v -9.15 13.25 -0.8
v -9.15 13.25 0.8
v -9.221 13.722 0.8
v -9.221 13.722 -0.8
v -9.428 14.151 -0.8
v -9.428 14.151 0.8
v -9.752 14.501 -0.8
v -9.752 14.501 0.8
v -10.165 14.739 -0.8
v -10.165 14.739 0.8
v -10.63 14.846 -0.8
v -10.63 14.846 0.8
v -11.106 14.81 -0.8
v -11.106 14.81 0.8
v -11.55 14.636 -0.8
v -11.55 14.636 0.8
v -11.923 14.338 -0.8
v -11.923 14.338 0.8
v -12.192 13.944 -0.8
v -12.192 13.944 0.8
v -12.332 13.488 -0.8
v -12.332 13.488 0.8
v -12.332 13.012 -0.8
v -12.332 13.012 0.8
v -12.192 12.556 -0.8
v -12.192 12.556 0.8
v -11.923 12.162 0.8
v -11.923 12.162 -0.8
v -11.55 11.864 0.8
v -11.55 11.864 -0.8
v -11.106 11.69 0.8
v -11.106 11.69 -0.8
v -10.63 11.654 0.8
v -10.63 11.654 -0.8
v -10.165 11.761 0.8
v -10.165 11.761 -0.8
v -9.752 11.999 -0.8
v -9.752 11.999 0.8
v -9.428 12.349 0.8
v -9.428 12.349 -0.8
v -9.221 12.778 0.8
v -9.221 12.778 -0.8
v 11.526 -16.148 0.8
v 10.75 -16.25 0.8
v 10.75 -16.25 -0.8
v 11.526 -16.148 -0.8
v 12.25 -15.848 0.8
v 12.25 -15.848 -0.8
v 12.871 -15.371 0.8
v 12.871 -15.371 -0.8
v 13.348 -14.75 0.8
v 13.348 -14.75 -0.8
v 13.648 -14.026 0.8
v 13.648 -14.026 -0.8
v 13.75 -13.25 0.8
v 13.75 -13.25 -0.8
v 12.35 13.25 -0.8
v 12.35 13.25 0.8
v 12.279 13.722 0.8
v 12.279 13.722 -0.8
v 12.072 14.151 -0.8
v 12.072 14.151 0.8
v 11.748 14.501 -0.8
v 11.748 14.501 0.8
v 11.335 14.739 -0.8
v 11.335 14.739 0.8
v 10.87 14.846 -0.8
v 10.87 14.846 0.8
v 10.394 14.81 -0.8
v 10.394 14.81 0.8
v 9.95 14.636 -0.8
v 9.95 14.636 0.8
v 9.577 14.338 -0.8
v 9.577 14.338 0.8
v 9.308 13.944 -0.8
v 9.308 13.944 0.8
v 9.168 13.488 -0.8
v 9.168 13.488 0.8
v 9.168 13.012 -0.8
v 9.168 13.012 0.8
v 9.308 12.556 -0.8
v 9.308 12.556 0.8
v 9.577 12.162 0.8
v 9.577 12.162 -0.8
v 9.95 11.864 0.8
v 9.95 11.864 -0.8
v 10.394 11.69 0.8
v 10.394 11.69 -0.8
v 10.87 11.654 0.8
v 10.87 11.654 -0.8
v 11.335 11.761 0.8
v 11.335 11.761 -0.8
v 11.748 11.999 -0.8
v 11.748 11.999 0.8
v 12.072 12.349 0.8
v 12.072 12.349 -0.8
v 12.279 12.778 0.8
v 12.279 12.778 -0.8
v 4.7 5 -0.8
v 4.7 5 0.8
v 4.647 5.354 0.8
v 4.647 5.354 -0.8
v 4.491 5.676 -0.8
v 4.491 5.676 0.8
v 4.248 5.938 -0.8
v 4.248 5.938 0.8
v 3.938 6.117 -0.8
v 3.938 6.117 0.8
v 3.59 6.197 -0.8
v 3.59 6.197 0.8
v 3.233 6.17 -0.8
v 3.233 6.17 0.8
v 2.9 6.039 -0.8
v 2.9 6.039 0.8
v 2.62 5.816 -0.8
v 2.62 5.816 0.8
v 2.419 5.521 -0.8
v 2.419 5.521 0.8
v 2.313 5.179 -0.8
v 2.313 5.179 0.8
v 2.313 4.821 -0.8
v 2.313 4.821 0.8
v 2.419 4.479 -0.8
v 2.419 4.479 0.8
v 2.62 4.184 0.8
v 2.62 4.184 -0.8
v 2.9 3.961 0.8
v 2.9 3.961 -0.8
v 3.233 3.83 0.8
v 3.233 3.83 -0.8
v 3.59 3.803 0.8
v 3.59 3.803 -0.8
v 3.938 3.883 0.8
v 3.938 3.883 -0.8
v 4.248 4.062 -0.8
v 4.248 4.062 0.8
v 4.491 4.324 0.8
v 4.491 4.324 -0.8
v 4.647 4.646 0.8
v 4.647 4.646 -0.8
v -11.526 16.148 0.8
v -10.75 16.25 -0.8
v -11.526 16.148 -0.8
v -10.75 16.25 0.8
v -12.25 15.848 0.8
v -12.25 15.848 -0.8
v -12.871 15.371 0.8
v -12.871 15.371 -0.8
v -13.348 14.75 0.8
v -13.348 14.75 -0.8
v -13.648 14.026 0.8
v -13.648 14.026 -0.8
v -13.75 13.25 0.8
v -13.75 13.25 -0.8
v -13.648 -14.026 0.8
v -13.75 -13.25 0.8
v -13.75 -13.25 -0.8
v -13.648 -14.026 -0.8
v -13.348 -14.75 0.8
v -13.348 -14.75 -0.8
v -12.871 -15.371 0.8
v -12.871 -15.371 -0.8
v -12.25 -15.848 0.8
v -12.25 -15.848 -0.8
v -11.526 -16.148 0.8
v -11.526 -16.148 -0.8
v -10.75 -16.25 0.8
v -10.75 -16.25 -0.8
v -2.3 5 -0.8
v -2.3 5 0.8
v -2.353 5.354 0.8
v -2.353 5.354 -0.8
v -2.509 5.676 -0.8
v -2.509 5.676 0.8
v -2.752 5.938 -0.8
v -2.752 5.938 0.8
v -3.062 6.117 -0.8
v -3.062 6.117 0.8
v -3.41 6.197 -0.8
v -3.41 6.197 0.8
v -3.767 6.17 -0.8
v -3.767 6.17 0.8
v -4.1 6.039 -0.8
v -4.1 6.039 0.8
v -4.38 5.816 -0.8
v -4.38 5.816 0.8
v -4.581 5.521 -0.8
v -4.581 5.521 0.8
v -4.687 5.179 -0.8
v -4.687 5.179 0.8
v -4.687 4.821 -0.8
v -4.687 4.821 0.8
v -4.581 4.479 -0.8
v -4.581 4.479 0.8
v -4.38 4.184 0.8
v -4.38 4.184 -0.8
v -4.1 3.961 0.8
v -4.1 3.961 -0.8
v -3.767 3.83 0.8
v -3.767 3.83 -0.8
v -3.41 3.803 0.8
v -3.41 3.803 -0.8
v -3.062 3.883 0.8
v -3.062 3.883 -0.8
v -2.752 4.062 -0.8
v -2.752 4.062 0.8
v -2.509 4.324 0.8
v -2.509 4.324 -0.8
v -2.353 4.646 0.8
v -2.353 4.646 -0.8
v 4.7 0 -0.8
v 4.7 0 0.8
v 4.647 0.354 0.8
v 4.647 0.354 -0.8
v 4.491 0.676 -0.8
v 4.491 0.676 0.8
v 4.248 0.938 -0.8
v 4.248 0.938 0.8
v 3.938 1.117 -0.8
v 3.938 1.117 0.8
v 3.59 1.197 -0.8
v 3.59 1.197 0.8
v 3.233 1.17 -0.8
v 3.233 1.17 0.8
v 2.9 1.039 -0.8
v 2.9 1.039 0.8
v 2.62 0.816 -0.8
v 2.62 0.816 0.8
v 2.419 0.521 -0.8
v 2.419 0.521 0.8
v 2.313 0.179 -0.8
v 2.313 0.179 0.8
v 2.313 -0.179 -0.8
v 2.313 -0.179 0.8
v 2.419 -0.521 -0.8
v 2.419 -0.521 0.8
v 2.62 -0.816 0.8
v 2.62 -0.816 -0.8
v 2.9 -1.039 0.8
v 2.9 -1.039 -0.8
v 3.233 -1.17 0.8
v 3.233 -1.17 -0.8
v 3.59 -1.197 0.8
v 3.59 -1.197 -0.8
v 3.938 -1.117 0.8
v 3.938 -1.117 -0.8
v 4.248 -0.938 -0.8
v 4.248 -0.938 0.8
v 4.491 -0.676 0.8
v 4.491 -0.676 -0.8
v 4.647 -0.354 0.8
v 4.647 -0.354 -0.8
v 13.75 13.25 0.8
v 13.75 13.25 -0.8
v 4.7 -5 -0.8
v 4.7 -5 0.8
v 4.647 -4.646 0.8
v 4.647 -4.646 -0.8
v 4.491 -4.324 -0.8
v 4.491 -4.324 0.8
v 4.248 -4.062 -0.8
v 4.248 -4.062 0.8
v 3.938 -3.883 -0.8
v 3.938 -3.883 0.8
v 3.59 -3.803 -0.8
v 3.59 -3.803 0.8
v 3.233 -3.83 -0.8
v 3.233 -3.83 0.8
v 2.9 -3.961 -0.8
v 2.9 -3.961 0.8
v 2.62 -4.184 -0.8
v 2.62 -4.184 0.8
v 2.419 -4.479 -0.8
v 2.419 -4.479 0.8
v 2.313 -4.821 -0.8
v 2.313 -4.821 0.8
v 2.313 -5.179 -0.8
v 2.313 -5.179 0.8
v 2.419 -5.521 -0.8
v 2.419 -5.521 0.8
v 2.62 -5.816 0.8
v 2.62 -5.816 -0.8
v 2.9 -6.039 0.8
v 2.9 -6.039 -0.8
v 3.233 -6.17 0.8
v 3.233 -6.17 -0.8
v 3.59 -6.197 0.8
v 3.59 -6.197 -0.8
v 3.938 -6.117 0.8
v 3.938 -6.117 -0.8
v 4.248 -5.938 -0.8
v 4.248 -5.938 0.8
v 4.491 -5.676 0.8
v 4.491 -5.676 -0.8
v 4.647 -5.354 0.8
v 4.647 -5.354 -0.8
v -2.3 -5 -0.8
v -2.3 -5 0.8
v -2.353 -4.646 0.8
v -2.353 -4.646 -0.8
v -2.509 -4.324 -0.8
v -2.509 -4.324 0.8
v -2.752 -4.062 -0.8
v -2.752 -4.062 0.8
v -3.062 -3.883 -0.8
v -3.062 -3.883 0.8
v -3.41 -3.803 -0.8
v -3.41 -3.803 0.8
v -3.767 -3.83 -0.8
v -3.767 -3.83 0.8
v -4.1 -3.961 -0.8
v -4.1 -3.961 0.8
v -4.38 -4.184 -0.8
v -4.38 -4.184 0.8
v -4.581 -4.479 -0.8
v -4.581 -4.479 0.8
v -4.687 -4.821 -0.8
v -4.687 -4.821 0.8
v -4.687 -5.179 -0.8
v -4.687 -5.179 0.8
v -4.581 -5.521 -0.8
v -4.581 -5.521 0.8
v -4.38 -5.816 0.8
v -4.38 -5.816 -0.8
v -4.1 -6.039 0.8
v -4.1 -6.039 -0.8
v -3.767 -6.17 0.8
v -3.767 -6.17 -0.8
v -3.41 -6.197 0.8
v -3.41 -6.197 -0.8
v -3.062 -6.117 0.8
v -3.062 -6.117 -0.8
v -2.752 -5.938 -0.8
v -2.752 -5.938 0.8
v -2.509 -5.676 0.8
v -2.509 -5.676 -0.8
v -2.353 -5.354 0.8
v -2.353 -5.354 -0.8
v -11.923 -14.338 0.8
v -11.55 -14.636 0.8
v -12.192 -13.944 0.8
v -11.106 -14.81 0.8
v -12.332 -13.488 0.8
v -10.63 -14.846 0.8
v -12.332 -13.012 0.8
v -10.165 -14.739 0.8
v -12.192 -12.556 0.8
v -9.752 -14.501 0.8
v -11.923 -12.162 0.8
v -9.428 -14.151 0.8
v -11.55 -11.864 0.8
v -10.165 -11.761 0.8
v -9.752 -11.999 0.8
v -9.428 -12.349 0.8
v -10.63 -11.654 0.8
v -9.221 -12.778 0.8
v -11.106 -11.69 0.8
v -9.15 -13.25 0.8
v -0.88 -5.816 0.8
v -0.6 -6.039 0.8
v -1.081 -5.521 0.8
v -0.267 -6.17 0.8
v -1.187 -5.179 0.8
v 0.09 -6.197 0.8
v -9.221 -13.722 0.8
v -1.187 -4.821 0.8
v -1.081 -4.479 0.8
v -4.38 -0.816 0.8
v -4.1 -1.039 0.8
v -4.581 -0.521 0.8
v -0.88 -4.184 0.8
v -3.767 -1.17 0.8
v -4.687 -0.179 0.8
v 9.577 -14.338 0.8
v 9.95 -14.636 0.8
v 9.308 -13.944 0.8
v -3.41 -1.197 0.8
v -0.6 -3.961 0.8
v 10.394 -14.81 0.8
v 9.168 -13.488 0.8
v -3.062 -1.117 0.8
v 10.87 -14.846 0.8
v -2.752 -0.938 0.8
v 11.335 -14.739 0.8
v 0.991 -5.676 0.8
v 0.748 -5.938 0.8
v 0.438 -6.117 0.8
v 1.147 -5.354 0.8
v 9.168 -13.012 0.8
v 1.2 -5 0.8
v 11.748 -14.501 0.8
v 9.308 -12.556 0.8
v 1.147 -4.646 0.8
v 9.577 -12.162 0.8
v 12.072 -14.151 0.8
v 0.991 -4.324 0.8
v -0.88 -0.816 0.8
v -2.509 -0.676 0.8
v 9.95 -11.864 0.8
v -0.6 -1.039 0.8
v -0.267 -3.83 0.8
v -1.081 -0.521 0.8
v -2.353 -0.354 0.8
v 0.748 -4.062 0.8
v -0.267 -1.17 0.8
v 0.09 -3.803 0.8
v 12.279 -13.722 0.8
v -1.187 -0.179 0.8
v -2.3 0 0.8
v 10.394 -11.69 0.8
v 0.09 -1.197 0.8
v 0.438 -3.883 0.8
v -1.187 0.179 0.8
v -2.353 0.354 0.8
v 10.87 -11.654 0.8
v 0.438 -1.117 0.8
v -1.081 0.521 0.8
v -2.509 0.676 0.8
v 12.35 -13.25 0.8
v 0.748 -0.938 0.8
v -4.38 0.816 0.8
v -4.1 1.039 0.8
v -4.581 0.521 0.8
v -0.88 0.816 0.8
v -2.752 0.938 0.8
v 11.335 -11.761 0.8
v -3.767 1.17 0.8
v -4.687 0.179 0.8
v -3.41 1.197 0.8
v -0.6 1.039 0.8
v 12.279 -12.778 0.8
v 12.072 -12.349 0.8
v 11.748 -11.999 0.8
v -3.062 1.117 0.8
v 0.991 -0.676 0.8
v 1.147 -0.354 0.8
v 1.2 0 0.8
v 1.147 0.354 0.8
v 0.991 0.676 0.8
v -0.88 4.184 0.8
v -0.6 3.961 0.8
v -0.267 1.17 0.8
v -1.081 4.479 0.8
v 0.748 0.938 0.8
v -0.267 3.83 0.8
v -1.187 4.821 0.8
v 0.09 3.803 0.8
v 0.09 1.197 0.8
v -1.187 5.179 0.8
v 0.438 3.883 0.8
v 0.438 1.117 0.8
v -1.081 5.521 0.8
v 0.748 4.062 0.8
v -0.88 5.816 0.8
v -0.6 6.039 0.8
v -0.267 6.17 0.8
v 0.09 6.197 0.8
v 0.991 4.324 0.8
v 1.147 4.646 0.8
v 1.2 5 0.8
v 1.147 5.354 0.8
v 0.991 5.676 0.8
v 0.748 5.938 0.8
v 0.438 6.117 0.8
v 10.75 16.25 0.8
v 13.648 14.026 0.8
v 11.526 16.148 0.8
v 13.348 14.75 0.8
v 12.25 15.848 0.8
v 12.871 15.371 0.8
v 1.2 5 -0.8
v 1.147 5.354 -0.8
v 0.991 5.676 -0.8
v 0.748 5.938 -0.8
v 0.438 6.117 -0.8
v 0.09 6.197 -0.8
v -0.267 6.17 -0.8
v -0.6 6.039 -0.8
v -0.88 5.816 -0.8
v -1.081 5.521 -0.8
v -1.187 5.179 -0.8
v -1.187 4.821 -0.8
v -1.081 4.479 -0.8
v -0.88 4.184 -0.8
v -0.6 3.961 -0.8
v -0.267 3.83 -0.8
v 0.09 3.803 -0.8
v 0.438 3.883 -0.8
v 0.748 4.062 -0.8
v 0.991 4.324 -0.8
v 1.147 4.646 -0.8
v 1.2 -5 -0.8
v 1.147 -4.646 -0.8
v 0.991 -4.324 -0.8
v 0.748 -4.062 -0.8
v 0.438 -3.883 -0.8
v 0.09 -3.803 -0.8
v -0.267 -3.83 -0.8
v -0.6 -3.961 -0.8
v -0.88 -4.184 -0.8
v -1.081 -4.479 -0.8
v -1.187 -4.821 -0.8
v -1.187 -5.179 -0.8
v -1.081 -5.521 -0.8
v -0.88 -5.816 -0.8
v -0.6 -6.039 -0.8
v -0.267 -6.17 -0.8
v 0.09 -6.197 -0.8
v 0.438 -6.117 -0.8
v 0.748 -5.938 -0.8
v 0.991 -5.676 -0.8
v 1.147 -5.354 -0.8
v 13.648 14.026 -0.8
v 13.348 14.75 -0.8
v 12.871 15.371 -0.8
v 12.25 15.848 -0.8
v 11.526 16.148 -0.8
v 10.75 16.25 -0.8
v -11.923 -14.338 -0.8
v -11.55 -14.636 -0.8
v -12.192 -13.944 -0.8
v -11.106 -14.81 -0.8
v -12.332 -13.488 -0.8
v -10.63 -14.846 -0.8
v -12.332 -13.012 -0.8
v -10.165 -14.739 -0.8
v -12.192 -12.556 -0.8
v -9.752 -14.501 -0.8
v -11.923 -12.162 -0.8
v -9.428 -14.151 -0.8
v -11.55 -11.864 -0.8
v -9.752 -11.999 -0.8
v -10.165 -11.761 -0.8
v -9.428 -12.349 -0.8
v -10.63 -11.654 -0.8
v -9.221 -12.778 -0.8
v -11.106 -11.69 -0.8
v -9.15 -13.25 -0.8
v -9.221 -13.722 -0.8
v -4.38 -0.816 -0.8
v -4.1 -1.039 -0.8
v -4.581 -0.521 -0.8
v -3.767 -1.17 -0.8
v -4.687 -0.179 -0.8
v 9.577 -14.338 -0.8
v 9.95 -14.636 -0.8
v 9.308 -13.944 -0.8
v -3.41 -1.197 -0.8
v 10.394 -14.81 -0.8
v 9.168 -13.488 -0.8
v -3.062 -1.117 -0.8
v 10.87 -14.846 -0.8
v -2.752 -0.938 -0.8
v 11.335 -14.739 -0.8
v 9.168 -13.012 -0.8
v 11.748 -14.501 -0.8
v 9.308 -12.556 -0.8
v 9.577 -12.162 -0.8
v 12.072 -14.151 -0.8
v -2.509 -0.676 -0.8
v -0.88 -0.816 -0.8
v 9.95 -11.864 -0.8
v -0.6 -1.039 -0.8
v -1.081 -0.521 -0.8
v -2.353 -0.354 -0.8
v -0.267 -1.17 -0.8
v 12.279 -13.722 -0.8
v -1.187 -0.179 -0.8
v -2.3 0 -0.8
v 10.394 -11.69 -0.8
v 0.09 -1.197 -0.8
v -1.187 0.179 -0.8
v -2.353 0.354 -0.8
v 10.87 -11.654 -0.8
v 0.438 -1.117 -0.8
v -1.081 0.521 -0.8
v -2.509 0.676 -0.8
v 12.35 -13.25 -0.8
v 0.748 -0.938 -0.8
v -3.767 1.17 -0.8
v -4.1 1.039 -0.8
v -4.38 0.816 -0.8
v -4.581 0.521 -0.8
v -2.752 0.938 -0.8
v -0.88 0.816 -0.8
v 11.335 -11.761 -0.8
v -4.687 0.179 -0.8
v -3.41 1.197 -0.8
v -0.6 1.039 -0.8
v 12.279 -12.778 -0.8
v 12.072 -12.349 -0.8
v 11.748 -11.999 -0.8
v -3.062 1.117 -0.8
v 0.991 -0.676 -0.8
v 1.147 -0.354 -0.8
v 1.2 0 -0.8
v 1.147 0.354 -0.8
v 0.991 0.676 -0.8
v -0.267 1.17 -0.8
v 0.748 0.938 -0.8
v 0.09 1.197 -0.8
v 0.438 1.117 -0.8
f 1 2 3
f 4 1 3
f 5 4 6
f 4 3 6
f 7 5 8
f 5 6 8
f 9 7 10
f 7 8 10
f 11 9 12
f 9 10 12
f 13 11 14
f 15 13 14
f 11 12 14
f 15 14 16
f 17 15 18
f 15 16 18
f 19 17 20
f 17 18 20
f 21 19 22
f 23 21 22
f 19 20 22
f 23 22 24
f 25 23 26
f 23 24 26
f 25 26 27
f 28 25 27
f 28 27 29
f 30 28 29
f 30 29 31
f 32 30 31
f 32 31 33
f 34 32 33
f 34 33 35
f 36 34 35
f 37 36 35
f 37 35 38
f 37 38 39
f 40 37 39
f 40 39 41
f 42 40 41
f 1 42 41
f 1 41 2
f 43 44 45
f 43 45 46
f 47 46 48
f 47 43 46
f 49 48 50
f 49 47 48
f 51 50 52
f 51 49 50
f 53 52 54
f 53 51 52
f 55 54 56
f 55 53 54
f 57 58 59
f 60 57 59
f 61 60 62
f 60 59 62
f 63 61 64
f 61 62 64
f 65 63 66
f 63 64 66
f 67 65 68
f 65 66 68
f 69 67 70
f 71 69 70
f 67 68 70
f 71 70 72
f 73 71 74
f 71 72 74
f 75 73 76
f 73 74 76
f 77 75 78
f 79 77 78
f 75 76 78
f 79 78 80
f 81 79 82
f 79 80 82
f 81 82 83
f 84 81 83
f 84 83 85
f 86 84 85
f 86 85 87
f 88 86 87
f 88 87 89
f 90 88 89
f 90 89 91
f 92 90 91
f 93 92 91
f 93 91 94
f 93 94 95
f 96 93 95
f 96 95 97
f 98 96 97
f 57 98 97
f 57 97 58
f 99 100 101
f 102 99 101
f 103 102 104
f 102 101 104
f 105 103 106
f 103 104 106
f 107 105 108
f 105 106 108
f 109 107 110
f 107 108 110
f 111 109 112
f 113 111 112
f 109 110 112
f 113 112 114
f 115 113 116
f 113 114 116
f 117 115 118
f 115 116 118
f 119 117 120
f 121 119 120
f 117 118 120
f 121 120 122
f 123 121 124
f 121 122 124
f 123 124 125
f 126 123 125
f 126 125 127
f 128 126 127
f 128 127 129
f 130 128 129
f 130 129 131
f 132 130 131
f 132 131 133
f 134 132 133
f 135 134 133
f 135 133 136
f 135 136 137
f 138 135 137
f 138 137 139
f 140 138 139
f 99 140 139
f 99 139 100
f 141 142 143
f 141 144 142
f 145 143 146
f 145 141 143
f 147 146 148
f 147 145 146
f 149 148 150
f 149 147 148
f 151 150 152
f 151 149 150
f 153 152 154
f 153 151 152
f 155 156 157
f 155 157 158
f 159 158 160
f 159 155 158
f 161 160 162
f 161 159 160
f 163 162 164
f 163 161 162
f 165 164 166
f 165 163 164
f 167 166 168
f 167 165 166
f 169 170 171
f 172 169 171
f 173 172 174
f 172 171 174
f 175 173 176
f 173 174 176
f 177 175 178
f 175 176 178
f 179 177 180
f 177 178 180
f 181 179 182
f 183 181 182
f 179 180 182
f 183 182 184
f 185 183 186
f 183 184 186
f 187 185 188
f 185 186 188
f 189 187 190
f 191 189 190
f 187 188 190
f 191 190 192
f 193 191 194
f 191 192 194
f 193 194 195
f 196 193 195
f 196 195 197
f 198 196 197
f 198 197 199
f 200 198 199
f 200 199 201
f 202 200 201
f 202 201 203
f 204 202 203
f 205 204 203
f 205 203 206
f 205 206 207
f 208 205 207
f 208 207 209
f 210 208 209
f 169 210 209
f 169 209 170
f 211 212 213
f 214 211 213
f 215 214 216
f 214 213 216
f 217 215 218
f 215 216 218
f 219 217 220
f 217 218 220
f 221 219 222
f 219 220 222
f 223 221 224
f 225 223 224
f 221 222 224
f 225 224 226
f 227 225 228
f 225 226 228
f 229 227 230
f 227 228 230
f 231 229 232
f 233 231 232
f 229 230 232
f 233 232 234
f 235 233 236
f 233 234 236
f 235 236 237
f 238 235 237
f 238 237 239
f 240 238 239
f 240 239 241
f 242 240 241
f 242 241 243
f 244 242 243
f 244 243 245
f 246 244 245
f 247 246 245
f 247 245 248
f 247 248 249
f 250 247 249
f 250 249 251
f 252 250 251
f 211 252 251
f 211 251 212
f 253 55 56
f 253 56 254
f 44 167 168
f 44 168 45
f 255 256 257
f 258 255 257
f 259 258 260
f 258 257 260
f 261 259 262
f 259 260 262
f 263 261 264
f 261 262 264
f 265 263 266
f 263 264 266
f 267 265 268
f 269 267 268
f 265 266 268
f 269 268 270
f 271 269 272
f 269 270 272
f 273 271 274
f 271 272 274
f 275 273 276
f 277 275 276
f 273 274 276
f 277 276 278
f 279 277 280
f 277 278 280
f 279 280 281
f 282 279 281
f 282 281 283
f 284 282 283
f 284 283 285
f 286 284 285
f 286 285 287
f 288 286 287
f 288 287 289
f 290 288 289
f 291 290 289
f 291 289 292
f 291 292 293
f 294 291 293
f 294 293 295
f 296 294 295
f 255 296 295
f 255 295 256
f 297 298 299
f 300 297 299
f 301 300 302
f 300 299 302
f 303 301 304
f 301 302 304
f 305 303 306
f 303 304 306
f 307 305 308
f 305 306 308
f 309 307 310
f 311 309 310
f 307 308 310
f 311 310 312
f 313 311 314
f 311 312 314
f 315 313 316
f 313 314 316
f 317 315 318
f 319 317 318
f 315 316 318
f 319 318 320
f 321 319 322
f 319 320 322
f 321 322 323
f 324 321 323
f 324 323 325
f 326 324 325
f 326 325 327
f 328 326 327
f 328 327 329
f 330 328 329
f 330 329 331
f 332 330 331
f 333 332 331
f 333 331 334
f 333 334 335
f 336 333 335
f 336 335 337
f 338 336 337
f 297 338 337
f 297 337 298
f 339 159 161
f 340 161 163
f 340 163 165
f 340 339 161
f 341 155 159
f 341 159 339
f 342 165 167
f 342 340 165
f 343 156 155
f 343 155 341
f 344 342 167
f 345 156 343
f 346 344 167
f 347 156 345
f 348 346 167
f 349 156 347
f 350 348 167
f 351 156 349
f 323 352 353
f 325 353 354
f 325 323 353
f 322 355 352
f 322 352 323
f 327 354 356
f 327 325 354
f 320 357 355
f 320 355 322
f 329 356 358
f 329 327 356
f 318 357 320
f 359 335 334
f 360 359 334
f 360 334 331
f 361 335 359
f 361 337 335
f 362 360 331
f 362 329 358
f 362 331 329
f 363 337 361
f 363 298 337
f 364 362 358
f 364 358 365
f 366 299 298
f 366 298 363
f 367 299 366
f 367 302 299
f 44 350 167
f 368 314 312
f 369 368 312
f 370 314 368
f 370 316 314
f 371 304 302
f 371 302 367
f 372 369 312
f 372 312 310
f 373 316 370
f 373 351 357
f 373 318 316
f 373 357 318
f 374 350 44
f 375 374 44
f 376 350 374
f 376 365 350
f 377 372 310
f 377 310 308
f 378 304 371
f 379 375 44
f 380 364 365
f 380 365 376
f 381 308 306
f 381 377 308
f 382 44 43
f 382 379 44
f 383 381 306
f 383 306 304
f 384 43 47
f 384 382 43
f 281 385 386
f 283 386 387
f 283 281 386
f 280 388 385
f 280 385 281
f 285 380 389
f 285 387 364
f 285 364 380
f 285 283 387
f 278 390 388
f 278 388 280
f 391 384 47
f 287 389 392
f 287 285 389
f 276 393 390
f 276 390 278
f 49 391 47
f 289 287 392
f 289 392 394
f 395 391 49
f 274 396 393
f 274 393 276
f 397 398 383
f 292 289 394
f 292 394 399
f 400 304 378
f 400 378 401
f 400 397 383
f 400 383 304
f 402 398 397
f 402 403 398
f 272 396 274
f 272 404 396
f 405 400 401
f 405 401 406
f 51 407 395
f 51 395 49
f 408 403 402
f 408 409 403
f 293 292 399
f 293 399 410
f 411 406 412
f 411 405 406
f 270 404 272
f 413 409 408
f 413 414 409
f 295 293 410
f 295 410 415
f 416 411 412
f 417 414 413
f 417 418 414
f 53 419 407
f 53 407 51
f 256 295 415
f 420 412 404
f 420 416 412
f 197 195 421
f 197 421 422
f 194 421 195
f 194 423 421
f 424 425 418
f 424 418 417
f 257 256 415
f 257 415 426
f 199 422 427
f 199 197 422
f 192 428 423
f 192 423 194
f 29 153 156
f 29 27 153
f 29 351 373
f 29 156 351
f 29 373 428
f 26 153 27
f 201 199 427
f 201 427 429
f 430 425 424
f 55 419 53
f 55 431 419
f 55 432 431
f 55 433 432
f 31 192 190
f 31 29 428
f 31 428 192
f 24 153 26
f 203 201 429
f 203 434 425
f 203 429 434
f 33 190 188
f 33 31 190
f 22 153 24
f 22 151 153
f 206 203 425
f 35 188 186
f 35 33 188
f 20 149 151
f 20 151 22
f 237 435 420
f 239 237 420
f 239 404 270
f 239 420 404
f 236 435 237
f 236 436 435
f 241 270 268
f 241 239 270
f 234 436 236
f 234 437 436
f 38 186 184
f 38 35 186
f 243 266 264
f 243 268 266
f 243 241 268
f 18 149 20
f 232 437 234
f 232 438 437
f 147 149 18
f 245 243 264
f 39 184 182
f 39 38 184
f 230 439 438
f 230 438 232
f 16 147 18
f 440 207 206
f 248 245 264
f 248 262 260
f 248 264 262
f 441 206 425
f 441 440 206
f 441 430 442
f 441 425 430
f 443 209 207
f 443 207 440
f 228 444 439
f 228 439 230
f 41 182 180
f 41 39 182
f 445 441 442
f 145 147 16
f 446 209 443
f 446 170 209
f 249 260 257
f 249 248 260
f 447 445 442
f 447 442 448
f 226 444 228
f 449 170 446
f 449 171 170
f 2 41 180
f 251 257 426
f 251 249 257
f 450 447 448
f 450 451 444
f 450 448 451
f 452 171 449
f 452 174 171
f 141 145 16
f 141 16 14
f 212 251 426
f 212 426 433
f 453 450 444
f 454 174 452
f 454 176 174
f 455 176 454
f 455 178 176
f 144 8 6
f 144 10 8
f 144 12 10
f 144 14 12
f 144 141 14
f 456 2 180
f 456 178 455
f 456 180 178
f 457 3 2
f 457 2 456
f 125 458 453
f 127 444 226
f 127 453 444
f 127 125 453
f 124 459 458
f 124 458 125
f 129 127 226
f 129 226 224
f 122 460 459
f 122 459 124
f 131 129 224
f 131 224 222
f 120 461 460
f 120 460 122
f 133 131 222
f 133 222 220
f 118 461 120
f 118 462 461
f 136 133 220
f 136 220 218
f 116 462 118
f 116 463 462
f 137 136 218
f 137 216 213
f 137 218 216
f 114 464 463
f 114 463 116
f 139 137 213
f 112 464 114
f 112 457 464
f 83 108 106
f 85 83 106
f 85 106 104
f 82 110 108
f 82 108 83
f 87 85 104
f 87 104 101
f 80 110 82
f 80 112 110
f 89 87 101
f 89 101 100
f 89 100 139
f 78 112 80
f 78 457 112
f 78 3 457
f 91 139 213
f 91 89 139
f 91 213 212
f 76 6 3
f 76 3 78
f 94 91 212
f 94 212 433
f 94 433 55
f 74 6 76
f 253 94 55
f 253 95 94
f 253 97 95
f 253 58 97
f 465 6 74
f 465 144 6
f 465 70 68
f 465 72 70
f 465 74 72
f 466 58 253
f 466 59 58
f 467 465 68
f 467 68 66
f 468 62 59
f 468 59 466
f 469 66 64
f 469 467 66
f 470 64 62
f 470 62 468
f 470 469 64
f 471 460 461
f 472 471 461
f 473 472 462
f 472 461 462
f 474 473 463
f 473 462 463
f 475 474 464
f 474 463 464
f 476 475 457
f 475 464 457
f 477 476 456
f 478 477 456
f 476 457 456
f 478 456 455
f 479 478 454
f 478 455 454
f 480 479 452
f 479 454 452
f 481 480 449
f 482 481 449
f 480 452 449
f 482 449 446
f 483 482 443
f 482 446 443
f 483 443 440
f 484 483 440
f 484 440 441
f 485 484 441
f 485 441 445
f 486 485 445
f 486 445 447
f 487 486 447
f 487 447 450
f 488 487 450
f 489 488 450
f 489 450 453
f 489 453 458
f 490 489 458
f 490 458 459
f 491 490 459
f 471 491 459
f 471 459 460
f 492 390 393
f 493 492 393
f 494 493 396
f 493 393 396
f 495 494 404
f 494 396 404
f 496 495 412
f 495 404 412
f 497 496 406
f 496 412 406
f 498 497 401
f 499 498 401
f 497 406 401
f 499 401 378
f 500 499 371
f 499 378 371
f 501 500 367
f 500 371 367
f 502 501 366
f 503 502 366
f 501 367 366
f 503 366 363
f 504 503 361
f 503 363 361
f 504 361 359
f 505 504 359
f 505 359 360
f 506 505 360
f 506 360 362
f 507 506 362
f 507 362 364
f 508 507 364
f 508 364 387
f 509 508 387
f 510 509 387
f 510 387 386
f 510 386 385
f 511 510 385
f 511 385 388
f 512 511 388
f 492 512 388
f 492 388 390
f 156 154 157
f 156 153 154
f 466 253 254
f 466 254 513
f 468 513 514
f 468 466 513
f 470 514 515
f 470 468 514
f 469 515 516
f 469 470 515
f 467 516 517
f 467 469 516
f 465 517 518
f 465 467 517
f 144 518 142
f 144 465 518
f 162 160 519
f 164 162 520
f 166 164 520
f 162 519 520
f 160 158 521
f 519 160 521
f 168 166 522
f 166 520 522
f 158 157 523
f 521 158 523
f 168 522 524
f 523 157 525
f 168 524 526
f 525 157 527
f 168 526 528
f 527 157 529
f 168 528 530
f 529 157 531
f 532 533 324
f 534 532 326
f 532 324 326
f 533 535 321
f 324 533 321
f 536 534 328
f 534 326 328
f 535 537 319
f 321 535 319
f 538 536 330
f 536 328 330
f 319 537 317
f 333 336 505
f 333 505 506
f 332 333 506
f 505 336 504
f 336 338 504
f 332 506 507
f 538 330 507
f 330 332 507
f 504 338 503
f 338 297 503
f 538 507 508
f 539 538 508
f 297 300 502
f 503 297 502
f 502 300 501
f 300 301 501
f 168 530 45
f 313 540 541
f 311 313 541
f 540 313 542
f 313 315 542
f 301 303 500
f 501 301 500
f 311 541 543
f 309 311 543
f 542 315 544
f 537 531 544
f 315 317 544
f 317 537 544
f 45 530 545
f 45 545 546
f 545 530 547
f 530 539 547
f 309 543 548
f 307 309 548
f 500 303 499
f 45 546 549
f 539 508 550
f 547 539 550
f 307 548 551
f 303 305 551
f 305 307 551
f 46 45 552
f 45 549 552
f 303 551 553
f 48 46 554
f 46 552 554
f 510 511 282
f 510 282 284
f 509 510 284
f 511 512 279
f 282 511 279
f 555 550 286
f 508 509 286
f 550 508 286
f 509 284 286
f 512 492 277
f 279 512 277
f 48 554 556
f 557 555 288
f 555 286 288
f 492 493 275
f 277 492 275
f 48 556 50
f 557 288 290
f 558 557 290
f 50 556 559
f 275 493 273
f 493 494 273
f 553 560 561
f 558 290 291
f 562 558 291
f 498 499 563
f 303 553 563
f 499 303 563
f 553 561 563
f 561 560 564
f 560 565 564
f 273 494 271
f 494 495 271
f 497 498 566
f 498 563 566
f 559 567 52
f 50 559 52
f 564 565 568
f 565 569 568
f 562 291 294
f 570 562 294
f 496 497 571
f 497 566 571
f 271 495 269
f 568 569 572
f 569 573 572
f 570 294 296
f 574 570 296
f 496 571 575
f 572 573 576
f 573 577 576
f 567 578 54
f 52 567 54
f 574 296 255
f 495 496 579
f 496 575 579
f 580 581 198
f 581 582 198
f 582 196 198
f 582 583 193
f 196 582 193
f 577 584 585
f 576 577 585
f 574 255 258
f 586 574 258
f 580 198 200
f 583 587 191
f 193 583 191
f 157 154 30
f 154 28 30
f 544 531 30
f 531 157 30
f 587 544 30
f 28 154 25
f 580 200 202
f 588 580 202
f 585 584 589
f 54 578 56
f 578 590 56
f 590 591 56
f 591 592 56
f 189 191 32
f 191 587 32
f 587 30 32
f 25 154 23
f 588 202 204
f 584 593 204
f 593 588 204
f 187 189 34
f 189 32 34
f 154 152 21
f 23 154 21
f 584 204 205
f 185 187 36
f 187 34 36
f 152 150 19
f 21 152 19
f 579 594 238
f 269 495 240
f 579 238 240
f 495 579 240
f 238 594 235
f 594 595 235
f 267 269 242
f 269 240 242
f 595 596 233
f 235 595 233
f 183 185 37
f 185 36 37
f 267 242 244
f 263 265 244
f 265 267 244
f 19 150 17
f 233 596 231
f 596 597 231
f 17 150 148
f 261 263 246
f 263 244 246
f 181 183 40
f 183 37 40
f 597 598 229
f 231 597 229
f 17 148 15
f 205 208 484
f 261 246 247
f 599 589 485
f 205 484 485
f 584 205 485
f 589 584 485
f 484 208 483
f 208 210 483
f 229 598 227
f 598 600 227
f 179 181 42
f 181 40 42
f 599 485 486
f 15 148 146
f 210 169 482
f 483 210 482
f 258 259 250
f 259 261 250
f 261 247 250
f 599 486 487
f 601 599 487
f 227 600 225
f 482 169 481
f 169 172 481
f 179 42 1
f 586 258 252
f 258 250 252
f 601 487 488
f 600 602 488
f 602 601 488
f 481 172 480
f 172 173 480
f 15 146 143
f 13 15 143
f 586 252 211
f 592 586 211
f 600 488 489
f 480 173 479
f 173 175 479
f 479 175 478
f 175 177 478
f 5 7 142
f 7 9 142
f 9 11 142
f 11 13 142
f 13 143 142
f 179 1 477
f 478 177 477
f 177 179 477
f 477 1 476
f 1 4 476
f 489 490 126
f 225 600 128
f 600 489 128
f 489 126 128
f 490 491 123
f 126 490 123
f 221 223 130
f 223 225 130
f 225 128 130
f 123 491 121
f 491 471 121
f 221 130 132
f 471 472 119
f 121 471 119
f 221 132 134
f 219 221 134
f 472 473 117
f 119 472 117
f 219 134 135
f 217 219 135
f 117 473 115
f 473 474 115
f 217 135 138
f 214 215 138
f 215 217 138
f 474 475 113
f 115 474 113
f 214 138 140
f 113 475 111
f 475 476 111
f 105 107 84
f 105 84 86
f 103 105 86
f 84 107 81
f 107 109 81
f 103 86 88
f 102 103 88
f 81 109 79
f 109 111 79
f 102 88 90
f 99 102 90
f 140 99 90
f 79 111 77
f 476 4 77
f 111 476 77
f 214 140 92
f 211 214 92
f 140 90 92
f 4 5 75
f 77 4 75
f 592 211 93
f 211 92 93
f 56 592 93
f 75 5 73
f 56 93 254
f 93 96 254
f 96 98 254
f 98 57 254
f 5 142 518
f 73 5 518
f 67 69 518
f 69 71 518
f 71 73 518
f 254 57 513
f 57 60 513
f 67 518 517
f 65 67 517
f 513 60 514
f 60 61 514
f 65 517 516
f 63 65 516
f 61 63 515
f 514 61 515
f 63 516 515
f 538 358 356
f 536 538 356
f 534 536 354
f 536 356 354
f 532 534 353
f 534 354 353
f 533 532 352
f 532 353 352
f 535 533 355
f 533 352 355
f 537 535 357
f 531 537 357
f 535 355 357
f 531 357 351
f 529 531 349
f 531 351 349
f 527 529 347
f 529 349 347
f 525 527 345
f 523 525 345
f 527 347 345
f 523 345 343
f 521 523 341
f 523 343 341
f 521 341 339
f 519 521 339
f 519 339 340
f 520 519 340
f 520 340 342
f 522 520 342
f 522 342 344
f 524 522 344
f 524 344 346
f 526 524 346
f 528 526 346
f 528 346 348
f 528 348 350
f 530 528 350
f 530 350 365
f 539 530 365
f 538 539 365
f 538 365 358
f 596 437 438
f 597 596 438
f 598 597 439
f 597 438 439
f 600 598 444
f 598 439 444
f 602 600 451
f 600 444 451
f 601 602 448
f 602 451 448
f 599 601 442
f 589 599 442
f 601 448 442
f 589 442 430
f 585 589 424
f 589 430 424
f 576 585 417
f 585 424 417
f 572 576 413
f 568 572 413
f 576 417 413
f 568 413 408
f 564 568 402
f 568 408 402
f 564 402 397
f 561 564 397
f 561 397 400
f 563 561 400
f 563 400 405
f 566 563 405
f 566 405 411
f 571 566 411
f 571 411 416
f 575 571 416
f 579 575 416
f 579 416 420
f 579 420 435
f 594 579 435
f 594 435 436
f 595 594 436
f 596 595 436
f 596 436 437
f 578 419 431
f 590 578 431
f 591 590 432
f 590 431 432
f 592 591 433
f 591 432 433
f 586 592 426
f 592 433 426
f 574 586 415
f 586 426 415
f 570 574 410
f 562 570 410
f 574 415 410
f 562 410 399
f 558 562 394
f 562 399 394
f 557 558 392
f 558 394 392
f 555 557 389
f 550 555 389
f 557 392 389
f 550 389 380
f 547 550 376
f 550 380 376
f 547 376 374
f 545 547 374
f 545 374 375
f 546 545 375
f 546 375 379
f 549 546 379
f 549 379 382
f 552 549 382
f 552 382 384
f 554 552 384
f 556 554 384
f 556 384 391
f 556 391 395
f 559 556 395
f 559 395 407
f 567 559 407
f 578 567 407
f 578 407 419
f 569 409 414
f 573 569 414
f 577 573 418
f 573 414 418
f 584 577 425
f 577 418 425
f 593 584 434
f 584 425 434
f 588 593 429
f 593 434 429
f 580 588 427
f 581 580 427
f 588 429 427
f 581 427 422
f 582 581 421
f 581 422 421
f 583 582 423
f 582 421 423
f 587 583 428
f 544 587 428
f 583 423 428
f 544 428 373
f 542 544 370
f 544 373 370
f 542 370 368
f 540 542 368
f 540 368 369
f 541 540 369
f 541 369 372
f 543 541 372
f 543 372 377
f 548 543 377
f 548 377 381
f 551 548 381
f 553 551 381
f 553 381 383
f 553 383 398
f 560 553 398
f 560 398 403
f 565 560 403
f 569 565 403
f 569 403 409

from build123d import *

# Parameters (mm, degrees)
BOSS_EXTRUDE1_DEPTH = 0.8
SKETCH4_R           = 1.6
CUT_EXTRUDE3_DEPTH  = 22.346779617
SKETCH5_R           = 1.2
CUT_EXTRUDE4_DEPTH  = 22.346779617


with BuildPart() as part:
    # Sketch1 → Boss-Extrude1 (new, symmetric)
    with BuildSketch(Plane.XY):
        with BuildLine():
            Line((-13.75, 13.25), (-13.75, -13.25))
            ThreePointArc((-13.75, -13.25), (-12.871320344, -15.371320344), (-10.75, -16.25))
            Line((-10.75, -16.25), (10.75, -16.25))
            ThreePointArc((10.75, -16.25), (12.871320344, -15.371320344), (13.75, -13.25))
            Line((13.75, -13.25), (13.75, 13.25))
            ThreePointArc((13.75, 13.25), (12.871320344, 15.371320344), (10.75, 16.25))
            Line((10.75, 16.25), (-10.75, 16.25))
            ThreePointArc((-10.75, 16.25), (-12.871320344, 15.371320344), (-13.75, 13.25))
        make_face()
    extrude(amount=BOSS_EXTRUDE1_DEPTH, both=True)

    # Sketch4 → Cut-Extrude3 (cut, through all)
    with BuildSketch(Plane.XY.offset(0.8)):
        with Locations((10.75, 13.25)):
            Circle(SKETCH4_R)
        with Locations((10.75, -13.25)):
            Circle(SKETCH4_R)
        with Locations((-10.75, -13.25)):
            Circle(SKETCH4_R)
        with Locations((-10.75, 13.25)):
            Circle(SKETCH4_R)
    extrude(amount=-CUT_EXTRUDE3_DEPTH, mode=Mode.SUBTRACT)

    # Sketch5 → Cut-Extrude4 (cut, through all)
    with BuildSketch(Plane.XY.offset(0.8)):
        with Locations((3.5, -5)):
            Circle(SKETCH5_R)
        with Locations((0, -5)):
            Circle(SKETCH5_R)
        with Locations((-3.5, -5)):
            Circle(SKETCH5_R)
        with Locations((3.5, 5)):
            Circle(SKETCH5_R)
        with Locations((0, 5)):
            Circle(SKETCH5_R)
        with Locations((-3.5, 5)):
            Circle(SKETCH5_R)
        with Locations((-3.5, 0)):
            Circle(SKETCH5_R)
        Circle(SKETCH5_R)
        with Locations((3.5, 0)):
            Circle(SKETCH5_R)
    extrude(amount=-CUT_EXTRUDE4_DEPTH, mode=Mode.SUBTRACT)


solid = part.part
